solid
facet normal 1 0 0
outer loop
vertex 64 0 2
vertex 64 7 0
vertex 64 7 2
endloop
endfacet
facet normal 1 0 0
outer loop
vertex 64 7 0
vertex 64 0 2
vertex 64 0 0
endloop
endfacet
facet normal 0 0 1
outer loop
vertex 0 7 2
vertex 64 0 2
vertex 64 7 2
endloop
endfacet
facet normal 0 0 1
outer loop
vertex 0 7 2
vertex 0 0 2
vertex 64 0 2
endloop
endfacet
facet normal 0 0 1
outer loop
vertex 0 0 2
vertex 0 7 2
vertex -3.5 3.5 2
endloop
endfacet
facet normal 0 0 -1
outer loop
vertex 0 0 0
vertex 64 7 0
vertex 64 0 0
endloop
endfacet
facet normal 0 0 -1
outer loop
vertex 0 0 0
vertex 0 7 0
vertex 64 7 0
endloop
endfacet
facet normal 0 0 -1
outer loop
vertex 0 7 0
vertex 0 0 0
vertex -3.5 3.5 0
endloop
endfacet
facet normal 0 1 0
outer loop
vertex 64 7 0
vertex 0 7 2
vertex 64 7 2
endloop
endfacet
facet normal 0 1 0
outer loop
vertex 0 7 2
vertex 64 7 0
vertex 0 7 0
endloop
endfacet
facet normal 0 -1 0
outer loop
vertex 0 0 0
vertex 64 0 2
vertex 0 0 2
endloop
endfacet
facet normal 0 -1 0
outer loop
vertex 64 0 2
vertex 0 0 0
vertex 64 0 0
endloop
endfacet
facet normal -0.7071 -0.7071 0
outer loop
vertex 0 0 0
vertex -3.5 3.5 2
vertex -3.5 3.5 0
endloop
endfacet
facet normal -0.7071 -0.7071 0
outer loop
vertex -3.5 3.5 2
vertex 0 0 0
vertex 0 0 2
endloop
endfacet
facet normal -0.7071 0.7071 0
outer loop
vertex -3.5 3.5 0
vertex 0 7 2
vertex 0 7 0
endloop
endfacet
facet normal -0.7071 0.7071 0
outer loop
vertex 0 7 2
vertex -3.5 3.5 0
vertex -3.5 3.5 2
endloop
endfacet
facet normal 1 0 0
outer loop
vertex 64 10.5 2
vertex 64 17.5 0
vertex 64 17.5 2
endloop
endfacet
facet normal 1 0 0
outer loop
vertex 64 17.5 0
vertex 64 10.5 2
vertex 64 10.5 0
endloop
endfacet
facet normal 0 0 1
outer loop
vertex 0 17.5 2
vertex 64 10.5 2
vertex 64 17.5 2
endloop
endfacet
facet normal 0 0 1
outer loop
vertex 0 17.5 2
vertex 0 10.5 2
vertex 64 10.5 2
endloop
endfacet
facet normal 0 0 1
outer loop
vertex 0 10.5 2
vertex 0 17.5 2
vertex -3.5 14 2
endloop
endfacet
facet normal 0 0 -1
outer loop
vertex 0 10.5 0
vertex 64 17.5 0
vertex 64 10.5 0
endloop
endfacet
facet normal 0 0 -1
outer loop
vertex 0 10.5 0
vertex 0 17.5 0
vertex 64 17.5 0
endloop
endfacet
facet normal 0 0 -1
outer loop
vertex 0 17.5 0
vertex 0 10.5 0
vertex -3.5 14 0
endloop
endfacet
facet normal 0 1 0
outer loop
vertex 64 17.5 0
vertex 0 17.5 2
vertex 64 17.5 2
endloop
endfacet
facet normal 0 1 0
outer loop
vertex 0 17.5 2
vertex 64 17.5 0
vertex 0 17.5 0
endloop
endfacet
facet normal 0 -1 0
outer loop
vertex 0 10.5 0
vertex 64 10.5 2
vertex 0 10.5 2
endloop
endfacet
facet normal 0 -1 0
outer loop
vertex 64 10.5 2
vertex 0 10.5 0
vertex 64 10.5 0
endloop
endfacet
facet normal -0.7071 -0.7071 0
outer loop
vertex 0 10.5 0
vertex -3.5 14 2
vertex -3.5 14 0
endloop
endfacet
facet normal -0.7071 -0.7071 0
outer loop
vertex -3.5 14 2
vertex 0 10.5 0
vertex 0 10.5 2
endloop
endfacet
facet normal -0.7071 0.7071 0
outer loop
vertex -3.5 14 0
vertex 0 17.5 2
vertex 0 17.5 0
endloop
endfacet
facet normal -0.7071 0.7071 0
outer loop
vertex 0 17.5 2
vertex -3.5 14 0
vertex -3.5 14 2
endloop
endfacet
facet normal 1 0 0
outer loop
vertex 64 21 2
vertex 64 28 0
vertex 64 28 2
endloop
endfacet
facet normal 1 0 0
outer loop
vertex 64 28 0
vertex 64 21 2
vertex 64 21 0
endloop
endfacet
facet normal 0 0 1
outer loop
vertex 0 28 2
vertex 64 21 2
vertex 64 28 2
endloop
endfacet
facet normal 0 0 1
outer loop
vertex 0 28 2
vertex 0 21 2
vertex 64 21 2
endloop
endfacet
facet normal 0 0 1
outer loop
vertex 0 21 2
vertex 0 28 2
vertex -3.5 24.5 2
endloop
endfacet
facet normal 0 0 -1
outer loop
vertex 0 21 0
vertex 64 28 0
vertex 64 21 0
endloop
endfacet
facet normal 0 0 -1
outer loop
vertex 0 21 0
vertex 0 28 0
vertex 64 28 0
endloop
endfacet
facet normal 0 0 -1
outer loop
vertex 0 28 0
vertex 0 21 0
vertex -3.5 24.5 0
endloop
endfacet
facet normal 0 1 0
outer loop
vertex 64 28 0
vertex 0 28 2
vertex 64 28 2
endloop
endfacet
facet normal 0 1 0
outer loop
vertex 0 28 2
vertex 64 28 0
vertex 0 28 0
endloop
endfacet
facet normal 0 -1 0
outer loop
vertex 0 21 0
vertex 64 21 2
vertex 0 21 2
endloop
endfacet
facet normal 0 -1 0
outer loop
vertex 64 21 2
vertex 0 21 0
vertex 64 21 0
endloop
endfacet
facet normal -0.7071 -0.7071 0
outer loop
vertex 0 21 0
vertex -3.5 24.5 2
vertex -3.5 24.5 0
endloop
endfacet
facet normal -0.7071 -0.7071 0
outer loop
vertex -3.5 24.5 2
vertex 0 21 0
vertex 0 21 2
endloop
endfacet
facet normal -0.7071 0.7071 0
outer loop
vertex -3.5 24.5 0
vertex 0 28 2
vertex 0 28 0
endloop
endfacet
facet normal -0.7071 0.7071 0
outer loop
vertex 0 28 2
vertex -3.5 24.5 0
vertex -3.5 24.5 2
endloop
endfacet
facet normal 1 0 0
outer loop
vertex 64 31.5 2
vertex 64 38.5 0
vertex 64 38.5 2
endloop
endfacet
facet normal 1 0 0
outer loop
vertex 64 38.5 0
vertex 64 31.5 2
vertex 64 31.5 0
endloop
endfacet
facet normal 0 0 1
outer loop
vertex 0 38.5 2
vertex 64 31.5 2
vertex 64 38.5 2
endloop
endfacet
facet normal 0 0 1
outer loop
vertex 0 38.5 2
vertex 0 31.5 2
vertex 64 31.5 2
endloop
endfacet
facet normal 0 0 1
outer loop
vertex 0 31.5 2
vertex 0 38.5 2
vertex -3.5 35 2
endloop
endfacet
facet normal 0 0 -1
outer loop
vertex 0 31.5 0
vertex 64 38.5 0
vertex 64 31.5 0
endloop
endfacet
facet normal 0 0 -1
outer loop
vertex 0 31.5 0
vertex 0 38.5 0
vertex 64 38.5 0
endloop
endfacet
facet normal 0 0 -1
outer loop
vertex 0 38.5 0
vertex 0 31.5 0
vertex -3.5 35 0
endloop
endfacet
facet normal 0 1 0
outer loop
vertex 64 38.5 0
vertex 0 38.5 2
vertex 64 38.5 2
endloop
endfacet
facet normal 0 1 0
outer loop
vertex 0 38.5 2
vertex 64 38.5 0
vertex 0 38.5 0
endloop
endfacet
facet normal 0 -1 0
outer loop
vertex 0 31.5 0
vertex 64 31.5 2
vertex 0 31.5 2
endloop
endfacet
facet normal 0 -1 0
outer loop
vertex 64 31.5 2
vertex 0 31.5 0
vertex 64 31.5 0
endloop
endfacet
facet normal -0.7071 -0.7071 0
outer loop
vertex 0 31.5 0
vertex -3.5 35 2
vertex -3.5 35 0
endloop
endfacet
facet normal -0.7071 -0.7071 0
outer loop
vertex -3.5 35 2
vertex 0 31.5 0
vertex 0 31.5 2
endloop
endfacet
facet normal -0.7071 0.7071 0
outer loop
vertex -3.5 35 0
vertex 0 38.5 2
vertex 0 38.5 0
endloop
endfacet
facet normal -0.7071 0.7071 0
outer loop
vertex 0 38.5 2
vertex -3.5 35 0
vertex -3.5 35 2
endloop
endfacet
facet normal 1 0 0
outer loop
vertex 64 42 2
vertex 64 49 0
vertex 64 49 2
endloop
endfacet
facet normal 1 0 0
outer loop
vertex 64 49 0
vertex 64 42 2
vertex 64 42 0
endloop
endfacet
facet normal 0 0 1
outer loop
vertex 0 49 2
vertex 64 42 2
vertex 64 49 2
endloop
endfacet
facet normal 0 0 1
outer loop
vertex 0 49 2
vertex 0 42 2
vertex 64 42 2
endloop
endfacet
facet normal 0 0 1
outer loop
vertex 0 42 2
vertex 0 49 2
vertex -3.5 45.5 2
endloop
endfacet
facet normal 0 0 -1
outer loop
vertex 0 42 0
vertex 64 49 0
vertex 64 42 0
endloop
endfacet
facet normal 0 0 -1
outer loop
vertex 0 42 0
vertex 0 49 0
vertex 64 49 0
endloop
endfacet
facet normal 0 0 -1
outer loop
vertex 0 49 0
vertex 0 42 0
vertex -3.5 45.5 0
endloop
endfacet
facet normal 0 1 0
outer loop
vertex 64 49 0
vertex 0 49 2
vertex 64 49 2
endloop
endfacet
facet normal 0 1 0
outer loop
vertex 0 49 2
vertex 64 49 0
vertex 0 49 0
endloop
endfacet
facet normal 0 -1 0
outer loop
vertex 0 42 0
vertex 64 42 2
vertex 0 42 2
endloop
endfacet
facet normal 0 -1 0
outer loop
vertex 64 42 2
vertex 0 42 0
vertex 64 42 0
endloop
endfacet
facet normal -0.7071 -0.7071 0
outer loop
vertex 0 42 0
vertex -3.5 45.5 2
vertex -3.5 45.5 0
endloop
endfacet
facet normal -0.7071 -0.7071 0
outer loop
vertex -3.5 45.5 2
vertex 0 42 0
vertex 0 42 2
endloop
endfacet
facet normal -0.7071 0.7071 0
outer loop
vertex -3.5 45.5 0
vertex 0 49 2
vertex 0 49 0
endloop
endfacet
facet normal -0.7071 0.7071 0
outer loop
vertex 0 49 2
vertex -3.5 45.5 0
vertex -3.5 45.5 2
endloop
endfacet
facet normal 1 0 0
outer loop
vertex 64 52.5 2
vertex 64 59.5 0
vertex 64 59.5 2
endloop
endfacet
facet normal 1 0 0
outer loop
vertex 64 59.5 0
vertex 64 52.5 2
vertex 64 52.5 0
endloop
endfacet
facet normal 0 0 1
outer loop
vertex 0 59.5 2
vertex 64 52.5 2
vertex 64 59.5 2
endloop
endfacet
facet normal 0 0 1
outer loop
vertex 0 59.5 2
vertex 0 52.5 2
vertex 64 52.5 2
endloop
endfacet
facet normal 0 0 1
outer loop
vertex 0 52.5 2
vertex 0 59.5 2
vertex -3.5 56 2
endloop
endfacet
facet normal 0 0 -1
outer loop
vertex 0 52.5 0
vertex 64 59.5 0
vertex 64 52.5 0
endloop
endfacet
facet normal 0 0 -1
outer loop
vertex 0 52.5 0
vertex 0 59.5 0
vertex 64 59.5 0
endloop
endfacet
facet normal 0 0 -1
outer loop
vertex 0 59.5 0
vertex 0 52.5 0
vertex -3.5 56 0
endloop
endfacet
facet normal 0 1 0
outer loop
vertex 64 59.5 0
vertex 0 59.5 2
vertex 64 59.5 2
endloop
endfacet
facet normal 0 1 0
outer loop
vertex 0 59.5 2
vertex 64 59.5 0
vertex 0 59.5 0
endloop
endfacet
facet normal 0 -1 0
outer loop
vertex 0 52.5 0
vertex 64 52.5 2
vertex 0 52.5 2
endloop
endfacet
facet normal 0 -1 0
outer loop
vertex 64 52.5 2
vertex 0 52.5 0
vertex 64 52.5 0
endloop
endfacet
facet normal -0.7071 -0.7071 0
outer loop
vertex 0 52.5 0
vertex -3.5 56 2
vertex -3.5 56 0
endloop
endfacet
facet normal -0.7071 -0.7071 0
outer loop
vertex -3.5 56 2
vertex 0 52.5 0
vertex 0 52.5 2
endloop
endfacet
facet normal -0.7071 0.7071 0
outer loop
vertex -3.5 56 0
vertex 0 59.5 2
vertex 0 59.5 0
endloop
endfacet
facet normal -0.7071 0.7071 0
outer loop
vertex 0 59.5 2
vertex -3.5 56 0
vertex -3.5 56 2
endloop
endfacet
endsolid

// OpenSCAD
// Length in mm
l = 64;

// Width in mm
w = 7;

// Height in mm
h = 2;

// Quantity
q = 6;

// Pointy?
p = 1; // [1:Pointy,0:Not Pointy]

module widget(l, w, h) {
  cube(size = [l, w, h]);
  if (p) {
    point_width = sqrt(w*w + w*w)/2;
    rotate([0,0,45]) cube(size = [point_width,point_width,h]);
  }    
}

for (i = [0:q-1]) {
  translate([0, i * 1.5 * w]) widget(l, w, h);
}   
